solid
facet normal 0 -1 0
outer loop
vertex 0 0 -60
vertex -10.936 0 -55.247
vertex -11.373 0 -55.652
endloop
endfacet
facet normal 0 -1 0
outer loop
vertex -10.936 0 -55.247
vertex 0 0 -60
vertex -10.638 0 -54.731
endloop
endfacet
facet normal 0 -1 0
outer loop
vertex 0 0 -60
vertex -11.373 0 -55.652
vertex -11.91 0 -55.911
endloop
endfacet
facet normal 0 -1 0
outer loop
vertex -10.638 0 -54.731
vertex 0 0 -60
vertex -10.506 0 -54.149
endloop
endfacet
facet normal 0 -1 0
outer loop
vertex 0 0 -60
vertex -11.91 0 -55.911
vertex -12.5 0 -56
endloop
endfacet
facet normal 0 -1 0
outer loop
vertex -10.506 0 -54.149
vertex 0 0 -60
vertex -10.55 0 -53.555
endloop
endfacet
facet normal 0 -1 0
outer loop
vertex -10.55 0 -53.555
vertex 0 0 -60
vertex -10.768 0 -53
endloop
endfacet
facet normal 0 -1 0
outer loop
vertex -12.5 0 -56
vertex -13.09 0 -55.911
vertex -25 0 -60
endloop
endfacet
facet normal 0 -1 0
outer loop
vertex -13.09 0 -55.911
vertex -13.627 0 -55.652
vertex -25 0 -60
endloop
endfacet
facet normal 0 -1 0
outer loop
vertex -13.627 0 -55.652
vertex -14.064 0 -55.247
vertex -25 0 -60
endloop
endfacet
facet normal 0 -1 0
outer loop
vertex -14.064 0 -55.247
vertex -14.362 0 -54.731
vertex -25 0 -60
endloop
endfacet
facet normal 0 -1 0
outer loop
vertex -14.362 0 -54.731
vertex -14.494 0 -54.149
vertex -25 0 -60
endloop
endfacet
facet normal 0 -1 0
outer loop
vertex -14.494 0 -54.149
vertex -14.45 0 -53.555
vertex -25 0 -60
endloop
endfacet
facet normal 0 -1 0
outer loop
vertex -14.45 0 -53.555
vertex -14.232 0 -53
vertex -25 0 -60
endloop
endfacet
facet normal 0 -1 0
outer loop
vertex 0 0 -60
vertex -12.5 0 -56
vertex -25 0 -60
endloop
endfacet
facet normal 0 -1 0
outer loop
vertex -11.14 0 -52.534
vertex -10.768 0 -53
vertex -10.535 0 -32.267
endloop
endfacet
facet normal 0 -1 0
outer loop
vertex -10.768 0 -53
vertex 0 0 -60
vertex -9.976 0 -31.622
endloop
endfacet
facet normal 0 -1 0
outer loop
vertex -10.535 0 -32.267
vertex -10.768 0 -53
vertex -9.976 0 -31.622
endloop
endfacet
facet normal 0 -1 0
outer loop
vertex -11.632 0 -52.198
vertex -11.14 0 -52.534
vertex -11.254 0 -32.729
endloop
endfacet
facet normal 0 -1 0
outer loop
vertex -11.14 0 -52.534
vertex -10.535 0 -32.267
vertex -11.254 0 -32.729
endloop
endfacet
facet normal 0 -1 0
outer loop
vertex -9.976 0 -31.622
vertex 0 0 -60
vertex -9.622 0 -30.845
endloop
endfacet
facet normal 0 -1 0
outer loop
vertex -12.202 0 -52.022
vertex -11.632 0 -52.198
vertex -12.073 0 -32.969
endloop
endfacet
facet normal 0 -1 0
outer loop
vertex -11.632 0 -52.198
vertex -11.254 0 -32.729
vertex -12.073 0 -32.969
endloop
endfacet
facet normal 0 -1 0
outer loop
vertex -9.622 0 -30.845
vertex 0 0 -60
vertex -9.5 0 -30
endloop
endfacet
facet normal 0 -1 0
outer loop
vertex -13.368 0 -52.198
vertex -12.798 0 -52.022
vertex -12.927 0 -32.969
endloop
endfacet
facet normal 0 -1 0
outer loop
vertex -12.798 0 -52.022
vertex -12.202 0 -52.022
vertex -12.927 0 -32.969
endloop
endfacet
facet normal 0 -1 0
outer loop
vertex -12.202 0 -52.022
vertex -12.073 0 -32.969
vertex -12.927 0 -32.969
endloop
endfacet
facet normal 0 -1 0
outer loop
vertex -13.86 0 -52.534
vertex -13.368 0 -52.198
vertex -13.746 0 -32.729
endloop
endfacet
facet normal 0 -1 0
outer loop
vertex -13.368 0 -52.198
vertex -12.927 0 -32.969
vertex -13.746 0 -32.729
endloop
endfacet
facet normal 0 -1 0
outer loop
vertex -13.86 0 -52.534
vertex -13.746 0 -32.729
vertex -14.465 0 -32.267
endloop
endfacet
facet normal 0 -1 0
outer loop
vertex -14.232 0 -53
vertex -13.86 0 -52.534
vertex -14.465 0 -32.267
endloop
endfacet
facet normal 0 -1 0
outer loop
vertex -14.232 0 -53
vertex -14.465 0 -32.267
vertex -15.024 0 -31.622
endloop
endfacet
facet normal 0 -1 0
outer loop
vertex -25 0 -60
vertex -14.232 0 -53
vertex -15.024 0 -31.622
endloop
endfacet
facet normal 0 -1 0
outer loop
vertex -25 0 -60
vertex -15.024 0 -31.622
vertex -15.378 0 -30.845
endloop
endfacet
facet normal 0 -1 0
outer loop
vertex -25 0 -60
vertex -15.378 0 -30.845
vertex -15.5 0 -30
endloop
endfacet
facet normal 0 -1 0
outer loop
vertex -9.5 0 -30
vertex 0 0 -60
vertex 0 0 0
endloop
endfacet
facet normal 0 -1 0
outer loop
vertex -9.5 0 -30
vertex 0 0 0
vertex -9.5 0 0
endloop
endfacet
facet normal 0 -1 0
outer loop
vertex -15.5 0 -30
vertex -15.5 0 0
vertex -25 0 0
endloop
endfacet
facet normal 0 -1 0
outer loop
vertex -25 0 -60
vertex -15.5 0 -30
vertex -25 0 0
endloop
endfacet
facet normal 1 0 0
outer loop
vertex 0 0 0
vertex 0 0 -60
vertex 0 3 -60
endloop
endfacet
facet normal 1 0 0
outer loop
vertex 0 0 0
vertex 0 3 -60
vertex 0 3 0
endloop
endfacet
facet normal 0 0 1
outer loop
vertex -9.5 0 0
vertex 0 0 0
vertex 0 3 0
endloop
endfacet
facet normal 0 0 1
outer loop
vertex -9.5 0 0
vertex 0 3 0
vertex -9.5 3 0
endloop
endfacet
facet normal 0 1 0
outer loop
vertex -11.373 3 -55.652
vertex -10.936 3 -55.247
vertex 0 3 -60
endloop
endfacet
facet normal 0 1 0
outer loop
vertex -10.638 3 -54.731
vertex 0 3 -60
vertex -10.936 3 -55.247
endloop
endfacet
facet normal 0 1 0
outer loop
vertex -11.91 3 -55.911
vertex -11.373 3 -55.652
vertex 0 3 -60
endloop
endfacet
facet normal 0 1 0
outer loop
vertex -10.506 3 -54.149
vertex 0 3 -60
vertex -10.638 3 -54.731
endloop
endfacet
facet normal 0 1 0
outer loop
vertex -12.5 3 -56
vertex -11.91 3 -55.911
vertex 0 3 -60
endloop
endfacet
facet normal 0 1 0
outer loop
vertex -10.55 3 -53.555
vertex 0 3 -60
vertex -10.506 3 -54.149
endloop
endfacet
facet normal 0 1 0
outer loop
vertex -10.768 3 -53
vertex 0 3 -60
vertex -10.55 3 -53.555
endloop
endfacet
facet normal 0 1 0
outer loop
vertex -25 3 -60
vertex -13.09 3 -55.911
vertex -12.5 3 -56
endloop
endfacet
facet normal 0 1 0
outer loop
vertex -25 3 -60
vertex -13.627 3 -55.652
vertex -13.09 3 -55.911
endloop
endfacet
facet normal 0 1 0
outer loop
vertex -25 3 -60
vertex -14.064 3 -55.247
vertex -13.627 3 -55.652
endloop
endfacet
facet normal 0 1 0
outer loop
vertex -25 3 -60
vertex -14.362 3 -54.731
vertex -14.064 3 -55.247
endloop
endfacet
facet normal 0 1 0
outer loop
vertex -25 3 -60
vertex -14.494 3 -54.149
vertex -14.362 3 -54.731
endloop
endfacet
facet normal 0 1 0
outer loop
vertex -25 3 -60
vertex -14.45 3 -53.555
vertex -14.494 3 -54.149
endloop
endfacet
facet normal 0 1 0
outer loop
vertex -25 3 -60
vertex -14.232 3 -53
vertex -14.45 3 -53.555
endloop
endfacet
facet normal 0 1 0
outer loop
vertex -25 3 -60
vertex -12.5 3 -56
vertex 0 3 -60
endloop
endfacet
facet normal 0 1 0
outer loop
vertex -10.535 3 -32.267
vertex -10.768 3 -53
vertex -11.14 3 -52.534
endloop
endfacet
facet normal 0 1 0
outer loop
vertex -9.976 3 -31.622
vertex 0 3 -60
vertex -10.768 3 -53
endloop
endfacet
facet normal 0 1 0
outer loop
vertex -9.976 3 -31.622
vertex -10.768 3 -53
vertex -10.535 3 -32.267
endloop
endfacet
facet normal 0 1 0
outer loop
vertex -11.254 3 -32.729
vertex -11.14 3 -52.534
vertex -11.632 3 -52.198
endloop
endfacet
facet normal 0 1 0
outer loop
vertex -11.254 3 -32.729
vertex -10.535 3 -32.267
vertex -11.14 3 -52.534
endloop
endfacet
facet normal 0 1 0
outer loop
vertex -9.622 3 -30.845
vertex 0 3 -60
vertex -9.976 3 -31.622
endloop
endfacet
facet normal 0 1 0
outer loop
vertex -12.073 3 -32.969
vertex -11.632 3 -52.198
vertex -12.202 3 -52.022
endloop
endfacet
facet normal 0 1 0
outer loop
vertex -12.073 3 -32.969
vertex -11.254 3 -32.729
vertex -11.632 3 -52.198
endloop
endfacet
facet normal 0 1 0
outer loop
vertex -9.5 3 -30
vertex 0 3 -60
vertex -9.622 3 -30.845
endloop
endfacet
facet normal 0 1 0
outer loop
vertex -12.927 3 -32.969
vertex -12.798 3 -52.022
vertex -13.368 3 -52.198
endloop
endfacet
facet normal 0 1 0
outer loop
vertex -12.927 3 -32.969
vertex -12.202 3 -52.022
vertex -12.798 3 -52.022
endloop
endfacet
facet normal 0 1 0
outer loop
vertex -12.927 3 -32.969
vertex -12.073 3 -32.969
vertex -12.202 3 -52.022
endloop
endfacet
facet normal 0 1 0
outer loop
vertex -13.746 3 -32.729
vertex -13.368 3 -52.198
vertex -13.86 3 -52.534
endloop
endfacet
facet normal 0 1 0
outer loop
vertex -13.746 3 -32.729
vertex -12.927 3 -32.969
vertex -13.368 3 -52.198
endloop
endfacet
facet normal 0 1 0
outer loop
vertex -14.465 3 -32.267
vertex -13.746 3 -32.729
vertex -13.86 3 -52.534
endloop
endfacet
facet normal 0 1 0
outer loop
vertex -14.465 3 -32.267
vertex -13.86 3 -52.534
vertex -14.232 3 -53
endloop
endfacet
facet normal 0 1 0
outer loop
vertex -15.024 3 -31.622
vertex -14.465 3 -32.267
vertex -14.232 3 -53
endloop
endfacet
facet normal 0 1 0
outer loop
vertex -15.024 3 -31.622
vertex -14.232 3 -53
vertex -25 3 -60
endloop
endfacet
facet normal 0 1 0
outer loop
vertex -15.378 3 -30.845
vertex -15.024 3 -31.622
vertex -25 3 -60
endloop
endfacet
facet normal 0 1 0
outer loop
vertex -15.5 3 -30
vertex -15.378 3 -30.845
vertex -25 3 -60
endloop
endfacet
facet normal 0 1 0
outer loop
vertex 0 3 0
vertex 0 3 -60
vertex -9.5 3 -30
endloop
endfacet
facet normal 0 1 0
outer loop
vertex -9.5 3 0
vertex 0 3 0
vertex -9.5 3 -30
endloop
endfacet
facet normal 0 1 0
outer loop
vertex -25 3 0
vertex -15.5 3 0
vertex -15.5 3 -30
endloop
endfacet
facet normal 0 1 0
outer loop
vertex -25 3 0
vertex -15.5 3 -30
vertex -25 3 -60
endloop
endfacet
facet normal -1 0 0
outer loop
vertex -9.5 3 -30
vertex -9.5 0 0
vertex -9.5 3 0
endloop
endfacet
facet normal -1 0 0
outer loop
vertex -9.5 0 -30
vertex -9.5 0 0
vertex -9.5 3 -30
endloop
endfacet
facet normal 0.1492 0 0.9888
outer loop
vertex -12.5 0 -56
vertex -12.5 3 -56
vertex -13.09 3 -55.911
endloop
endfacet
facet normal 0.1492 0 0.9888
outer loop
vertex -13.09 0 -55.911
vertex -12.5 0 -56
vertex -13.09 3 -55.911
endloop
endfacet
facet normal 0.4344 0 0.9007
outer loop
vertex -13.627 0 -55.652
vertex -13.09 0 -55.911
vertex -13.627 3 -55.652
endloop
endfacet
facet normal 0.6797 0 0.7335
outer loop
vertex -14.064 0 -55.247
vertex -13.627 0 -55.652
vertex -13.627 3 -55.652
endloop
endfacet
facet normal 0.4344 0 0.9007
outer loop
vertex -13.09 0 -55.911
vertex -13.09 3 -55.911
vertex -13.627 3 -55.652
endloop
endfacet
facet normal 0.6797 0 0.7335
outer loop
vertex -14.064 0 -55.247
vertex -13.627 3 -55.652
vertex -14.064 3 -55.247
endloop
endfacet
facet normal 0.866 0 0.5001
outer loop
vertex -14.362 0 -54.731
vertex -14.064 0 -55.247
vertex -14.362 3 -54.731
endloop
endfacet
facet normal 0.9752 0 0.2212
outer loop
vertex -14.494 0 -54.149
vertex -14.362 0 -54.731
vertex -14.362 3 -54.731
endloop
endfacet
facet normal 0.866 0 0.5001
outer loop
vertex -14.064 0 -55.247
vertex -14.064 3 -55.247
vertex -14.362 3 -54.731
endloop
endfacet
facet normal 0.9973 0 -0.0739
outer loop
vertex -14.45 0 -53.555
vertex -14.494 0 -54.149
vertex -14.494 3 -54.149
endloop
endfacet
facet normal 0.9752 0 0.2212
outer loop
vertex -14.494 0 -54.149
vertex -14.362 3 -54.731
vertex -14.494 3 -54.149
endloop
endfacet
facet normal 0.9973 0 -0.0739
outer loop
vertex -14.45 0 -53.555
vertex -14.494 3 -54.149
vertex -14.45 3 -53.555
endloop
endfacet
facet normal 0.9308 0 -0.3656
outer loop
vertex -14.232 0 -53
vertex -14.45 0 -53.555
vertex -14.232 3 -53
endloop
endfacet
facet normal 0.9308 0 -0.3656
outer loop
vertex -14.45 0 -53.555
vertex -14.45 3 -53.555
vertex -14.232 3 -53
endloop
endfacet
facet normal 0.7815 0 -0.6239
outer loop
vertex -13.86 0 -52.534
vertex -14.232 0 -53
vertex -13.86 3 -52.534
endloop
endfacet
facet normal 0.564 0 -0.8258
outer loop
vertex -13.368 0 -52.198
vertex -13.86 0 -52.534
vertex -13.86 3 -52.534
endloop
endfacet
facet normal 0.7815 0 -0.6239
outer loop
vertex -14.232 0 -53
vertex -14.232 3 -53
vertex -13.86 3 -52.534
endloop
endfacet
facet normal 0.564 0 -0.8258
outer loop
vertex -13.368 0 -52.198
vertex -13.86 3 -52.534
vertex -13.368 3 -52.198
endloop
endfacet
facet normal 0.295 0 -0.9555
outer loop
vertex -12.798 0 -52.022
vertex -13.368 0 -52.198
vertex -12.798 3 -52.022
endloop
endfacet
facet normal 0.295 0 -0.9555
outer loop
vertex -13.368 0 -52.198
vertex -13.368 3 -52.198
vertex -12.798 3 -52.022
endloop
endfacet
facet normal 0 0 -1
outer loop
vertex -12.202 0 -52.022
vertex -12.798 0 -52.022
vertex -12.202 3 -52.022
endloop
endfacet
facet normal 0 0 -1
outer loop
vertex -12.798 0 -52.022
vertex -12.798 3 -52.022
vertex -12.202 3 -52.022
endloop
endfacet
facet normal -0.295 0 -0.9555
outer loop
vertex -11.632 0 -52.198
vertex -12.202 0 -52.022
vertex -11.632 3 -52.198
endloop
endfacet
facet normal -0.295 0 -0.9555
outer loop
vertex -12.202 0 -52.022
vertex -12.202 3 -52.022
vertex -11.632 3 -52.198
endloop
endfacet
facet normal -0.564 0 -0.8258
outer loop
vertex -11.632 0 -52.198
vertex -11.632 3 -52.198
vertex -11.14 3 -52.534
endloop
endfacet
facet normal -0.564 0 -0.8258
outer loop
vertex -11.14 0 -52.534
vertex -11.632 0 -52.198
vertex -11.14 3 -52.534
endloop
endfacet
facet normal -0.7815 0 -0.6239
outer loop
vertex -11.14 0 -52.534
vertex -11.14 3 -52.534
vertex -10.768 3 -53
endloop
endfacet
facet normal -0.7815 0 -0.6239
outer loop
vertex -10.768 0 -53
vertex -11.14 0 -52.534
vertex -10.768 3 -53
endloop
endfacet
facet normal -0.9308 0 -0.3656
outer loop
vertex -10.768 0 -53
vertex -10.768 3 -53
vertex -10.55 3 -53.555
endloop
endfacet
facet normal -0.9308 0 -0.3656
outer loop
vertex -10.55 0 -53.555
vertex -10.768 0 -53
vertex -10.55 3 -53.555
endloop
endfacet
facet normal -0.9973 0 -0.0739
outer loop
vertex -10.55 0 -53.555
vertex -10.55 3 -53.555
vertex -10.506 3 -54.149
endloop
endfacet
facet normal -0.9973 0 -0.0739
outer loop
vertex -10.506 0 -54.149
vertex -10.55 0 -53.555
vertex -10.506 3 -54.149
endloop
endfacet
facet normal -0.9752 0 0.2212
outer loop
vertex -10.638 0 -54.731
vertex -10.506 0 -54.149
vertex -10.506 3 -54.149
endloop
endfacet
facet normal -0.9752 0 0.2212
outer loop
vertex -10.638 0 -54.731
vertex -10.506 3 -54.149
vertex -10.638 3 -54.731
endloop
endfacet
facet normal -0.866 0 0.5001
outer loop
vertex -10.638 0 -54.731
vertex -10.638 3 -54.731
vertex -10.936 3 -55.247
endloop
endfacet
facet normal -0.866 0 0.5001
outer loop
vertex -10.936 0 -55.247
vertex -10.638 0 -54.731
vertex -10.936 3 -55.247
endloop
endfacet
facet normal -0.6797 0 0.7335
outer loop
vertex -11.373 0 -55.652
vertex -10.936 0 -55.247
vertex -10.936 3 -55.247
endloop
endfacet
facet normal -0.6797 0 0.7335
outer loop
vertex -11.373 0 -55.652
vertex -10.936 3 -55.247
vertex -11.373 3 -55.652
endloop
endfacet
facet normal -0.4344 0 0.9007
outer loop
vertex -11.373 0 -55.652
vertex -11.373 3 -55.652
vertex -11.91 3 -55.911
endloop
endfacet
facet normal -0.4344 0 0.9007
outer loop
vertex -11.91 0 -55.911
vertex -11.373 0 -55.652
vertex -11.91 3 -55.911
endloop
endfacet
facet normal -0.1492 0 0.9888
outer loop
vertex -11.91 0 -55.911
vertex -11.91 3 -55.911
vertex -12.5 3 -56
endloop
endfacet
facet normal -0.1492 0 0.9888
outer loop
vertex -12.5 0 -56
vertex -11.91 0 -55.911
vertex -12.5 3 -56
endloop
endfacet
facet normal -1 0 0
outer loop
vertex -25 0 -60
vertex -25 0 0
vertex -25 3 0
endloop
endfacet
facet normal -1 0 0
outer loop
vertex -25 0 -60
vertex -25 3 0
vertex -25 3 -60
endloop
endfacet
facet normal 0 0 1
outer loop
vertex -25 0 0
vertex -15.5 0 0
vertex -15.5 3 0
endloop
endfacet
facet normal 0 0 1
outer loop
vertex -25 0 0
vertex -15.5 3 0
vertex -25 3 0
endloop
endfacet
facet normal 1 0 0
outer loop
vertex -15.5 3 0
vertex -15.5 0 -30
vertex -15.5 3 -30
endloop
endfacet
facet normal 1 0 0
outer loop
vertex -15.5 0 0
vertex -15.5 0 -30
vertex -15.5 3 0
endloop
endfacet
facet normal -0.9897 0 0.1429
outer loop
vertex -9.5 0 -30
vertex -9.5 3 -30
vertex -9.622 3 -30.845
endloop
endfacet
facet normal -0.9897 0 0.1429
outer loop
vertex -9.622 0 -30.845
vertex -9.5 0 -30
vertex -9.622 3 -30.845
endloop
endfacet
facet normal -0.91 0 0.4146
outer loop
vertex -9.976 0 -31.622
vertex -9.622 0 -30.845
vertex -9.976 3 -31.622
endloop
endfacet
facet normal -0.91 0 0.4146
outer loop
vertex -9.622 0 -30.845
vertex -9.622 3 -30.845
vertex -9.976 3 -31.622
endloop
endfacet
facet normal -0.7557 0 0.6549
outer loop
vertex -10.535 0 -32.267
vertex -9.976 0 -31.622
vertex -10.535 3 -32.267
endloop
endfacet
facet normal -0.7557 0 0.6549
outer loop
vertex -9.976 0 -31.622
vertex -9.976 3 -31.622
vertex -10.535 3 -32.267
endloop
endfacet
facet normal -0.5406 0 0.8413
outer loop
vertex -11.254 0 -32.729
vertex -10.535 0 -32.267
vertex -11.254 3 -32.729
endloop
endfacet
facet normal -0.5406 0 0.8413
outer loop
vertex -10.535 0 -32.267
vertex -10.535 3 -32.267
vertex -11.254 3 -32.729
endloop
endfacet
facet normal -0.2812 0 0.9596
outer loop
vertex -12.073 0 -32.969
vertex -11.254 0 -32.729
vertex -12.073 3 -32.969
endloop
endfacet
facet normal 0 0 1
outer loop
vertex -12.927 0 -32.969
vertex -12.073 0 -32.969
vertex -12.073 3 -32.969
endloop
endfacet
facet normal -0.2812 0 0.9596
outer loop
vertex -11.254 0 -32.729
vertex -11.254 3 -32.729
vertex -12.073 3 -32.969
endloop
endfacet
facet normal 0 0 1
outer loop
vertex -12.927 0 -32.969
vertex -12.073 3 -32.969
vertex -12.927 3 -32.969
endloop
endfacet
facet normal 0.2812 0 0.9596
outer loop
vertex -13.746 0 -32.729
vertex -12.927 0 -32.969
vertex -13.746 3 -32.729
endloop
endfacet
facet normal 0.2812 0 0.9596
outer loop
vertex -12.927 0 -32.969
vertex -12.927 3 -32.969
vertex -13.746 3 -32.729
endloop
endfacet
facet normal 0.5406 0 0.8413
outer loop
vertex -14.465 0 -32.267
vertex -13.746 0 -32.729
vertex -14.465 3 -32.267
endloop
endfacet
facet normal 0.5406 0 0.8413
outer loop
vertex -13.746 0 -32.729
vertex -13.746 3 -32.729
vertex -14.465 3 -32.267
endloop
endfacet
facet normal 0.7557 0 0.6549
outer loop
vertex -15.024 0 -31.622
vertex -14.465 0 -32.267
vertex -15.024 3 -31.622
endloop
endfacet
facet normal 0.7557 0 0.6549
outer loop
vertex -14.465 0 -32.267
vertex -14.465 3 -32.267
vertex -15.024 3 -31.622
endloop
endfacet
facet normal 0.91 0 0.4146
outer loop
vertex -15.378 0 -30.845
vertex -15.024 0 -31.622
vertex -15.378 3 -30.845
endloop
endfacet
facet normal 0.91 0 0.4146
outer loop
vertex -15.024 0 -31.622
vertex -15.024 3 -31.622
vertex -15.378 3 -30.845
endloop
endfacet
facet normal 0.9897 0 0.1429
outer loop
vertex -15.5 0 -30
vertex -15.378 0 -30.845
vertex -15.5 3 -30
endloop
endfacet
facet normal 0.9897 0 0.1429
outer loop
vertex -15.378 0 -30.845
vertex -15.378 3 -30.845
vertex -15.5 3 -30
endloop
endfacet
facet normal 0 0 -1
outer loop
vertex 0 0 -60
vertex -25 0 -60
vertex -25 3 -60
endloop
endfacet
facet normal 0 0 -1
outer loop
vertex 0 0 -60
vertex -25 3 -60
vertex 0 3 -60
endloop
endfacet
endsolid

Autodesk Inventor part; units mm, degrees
ref_plane "YZ Plane" through (0, 0, 0) normal (1, 0, 0) x (0, 1, 0)
ref_plane "XZ Plane" through (0, 0, 0) normal (0, 1, 0) x (-1, 0, 0)
ref_plane "XY Plane" through (0, 0, 0) normal (0, 0, 1) x (1, 0, 0)
sketch "Sketch1" plane through (0, 0, 0) normal (0, 1, 0) x (-1, 0, 0)
  line L0 (0, 0) -> (25, 0)
  line L1 (25, 0) -> (25, -60)
  line L2 (25, -60) -> (0, -60)
  line L3 (0, -60) -> (0, 0)
  point P0 (12.5, -54)
  dimension "d0" = 25
  dimension "d1" = 60
  dimension "d15" = 6
extrude "Extrusion1" add sketch "Sketch1" along normal blind 3
sketch "Sketch2" plane through (0, 0, 0) normal (0, -1, 0) x (1, 0, 0)
  point P0 (0, 0)
  point P1 (-12.5, -54)
hole "Hole2" at (-12.5, 0, -54) direction (0, 1, 0) diameter 4 end through all
sketch "Sketch3" plane through (0, 0, 0) normal (0, -1, 0) x (1, 0, 0)
  point P0 (0, 0)
  point P1 (-12.5, -30)
hole "Hole3" at (-12.5, 0, -30) direction (0, 1, 0) diameter 6 end through all
sketch "Sketch4" plane through (0, 0, 0) normal (0, -1, 0) x (1, 0, 0)
  circle A0 centre (-12.5, -30) radius 3 projected
  line L0 (-25, 0) -> (0, 0) projected
  line L1 (-9.5, -30) -> (-15.5, -30)
  line L2 (-15.5, -30) -> (-15.5, 0)
  line L3 (-15.5, 0) -> (-9.5, 0)
  line L4 (-9.5, 0) -> (-9.5, -30)
extrude "Extrusion2" cut sketch "Sketch4" against normal through all contours L1 A0 | A0 L2 L0 L4 picked at (-11.666, -28.6328)
properties part number "Spacer_lazy_susan"
